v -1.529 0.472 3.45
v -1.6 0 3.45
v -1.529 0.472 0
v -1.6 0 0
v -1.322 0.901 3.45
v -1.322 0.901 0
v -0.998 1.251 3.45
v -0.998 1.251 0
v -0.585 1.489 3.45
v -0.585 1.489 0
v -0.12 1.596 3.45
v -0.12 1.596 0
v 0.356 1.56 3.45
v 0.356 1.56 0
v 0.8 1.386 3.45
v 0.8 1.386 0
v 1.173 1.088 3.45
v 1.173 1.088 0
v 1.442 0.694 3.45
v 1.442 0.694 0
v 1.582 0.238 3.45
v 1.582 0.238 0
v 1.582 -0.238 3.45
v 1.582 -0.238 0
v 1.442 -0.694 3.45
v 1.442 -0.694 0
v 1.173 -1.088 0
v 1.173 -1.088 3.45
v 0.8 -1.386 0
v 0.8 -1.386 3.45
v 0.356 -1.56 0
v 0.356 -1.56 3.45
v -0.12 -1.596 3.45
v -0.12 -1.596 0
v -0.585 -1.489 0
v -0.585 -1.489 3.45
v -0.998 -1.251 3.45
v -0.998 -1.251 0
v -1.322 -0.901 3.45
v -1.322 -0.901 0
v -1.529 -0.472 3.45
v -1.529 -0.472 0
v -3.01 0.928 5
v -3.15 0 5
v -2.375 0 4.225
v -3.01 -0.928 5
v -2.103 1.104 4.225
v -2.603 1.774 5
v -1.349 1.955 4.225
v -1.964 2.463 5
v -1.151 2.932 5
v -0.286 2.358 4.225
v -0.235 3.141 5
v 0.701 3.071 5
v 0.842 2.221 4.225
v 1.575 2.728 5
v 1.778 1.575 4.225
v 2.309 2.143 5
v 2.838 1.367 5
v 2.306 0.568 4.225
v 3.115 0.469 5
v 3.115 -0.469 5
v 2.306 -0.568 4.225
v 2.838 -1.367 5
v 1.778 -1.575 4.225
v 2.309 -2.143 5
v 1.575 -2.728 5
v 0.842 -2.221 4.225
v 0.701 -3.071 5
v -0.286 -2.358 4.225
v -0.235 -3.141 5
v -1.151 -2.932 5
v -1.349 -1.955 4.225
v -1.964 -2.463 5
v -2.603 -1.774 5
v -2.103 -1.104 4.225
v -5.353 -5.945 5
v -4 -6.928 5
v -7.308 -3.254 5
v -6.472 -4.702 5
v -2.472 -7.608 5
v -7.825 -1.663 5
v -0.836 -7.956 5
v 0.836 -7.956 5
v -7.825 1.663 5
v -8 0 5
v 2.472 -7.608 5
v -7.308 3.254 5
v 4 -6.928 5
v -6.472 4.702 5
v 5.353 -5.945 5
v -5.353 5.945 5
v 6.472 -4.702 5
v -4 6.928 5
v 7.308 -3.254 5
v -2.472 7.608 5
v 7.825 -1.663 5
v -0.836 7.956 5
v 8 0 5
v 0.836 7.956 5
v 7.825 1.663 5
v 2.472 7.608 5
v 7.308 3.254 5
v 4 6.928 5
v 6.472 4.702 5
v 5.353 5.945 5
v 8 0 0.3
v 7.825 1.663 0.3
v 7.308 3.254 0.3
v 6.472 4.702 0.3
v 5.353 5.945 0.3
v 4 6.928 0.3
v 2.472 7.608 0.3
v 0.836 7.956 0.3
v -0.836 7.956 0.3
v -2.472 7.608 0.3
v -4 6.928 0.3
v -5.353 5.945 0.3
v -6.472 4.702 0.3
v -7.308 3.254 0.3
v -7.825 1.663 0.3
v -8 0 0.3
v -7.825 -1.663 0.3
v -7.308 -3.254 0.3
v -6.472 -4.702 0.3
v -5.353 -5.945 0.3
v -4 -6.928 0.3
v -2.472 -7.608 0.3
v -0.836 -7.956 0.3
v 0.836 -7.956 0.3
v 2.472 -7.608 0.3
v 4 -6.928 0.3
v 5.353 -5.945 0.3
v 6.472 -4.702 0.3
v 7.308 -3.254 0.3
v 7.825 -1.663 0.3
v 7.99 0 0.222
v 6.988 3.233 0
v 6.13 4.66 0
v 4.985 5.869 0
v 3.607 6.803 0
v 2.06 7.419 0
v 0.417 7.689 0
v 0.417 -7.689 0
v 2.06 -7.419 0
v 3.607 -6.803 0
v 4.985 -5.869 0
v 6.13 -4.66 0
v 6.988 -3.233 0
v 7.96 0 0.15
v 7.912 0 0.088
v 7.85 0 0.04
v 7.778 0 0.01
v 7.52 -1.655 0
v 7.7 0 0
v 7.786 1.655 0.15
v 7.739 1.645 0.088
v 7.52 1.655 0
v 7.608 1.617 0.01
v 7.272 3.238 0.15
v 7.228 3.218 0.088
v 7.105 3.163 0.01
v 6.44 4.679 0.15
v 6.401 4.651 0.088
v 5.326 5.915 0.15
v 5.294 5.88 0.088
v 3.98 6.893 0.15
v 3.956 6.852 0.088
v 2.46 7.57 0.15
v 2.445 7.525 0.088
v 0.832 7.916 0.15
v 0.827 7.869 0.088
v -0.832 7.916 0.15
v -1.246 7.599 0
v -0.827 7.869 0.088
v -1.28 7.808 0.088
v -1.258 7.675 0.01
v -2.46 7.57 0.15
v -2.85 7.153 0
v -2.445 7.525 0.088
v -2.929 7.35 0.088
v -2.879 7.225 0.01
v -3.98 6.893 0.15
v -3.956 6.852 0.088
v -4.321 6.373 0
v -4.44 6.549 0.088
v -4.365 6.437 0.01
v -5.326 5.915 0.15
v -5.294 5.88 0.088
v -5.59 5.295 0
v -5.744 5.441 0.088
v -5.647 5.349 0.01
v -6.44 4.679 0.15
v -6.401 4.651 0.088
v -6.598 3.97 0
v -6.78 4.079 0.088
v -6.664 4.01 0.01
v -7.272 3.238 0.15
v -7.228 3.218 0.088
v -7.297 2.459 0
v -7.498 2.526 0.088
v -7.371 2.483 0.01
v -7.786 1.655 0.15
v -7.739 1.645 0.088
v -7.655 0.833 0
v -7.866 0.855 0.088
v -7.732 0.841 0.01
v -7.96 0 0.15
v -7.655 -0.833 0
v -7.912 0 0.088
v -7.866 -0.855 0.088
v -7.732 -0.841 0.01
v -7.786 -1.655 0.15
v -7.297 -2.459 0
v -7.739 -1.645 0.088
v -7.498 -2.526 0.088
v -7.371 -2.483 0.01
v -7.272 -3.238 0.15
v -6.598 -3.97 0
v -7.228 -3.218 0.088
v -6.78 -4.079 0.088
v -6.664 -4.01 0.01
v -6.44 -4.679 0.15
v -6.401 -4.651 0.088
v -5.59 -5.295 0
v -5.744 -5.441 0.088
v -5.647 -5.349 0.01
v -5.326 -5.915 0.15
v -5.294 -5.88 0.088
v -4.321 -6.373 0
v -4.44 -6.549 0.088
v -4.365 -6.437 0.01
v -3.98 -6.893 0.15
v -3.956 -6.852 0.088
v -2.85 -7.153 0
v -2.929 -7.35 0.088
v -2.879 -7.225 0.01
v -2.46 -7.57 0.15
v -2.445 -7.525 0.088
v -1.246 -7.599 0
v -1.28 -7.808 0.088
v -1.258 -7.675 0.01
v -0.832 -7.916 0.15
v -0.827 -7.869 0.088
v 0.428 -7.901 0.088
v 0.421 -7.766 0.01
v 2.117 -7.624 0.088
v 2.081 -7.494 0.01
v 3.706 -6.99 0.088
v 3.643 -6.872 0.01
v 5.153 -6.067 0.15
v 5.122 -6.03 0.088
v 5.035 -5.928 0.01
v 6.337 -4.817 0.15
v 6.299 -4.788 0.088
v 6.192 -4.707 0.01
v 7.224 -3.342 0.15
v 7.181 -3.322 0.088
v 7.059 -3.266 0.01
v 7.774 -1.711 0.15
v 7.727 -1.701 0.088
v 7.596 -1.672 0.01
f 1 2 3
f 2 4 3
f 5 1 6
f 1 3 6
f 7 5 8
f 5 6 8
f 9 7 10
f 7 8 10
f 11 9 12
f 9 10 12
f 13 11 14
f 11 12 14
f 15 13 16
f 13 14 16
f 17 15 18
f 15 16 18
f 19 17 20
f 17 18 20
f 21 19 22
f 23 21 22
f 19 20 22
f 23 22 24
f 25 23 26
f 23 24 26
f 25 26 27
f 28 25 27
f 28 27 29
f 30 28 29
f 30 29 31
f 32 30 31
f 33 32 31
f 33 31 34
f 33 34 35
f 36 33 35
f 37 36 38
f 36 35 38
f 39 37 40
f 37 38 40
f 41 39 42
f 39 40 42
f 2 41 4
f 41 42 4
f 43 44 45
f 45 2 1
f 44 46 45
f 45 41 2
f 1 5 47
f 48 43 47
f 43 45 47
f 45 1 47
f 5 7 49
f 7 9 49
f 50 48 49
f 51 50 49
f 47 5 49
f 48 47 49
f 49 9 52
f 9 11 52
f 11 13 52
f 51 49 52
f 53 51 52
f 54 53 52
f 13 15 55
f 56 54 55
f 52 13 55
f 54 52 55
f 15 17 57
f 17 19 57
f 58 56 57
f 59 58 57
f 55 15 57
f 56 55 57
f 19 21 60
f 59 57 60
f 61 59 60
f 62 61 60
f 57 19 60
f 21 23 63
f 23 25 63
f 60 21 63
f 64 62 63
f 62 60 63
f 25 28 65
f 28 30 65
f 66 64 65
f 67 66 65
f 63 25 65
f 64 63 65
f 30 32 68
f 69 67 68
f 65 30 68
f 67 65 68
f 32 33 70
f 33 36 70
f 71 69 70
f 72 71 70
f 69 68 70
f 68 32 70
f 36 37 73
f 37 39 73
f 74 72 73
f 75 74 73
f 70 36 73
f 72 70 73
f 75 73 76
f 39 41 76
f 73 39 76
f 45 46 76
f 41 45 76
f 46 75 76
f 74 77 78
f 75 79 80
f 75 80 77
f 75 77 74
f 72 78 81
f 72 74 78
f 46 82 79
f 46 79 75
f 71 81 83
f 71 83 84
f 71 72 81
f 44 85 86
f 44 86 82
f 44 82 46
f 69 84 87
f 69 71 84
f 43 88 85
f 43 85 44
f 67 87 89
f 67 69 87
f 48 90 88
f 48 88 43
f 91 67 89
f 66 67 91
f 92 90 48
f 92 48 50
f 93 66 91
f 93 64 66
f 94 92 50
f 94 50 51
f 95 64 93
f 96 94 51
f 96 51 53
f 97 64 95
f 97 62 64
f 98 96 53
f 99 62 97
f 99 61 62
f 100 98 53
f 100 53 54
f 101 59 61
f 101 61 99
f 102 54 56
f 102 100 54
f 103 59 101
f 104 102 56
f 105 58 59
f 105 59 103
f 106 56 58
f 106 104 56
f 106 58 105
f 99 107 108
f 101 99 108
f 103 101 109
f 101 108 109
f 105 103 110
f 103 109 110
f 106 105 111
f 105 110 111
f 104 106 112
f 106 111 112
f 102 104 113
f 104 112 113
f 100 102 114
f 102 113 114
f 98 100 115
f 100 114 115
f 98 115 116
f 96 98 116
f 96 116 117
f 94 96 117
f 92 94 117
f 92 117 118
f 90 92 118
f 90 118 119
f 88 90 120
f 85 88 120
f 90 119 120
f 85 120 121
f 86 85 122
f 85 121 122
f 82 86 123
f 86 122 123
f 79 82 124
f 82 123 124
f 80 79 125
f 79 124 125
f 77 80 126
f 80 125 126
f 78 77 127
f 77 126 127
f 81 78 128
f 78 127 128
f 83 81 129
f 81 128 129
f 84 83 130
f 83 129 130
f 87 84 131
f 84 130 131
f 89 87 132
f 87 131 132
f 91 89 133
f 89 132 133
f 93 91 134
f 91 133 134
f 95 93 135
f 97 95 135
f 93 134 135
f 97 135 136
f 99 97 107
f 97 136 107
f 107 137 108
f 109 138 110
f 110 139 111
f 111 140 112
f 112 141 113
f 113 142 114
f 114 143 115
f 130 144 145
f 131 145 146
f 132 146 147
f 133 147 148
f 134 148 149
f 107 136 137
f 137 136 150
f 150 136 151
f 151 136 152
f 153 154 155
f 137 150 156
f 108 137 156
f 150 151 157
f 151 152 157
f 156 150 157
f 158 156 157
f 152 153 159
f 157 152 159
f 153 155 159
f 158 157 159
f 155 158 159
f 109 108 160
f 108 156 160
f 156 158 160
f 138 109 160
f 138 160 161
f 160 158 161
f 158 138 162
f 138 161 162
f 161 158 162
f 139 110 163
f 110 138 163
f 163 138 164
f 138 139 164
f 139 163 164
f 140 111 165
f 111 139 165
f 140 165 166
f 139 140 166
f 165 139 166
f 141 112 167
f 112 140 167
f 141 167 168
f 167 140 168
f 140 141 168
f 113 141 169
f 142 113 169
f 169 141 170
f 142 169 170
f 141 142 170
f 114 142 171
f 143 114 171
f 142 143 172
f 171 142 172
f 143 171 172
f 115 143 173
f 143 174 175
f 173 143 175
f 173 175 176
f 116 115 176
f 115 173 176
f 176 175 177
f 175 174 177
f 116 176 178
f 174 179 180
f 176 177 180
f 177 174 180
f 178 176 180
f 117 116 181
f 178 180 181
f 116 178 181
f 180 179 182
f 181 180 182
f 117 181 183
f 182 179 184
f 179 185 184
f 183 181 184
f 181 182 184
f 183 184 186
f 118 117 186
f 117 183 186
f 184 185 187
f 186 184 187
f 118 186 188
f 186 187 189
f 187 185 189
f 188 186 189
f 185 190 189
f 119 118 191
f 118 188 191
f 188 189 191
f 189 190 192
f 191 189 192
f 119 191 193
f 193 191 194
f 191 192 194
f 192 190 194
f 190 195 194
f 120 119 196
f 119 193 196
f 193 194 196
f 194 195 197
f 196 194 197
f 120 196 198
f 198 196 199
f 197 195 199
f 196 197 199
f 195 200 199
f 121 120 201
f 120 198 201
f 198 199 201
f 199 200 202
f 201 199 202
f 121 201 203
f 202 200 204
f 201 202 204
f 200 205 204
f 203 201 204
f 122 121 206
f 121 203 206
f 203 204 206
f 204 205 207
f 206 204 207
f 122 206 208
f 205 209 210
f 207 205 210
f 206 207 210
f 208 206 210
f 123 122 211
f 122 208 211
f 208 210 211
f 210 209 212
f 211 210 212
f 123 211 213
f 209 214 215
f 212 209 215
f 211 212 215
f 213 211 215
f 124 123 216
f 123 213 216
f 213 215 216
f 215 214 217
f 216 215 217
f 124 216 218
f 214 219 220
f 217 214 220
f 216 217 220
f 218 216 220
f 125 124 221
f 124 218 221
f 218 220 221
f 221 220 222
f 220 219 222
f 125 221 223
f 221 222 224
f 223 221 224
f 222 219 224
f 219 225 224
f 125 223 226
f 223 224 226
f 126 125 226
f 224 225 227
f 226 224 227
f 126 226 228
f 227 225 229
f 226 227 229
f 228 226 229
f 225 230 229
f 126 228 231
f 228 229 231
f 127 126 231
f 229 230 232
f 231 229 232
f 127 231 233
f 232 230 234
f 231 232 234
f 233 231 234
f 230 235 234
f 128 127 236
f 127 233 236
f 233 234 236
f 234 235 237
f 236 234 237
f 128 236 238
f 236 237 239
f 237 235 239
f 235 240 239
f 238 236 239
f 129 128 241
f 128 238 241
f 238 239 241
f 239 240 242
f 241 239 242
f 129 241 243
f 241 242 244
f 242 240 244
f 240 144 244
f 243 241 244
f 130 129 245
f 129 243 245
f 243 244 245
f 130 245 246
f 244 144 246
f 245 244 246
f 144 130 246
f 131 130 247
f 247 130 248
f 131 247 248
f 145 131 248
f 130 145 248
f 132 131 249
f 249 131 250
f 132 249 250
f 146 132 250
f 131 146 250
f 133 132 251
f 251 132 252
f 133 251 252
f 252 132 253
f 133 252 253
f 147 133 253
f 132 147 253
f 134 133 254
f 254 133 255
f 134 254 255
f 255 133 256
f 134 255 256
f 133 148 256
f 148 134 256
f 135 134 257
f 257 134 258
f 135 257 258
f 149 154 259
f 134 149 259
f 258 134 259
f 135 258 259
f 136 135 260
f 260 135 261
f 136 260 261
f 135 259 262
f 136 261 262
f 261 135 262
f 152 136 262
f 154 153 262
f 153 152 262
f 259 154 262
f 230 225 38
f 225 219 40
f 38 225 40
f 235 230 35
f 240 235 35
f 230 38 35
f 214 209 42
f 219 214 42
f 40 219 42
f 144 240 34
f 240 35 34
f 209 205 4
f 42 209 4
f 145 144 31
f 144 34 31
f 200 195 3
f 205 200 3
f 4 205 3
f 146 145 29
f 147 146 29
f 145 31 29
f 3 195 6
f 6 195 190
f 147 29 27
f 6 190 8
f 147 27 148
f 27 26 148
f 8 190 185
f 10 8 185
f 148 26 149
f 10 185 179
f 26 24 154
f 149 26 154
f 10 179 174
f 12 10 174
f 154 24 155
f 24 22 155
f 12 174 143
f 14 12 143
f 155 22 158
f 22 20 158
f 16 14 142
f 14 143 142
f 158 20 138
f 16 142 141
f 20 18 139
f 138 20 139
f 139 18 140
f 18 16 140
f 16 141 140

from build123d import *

# Parameters (mm, degrees)
ESBO_O1_R                                            = 8
RESSALTO_EXTRUS_O1_DEPTH                             = 5
FORMSENKUNG_F_R_M3_LINSENSENKSCHRAUBE_MI_D           = 3.2
FORMSENKUNG_F_R_M3_LINSENSENKSCHRAUBE_MI_DEPTH       = 20.87
FORMSENKUNG_F_R_M3_LINSENSENKSCHRAUBE_MI_CSINK_D     = 6.3
FORMSENKUNG_F_R_M3_LINSENSENKSCHRAUBE_MI_CSINK_ANGLE = 90
FORMSENKUNG_F_R_M3_LINSENSENKSCHRAUBE_MI_TIP         = 0.96137699
FILETE1_R                                            = 0.3


with BuildPart() as part:
    # Esboço1 → Ressalto-extrusão1 (new body)
    with BuildSketch(Plane.XY):
        Circle(ESBO_O1_R)
    extrude(amount=RESSALTO_EXTRUS_O1_DEPTH)

    # Formsenkung für M3 Linsensenkschraube mit Schlitz1
    with Locations(Plane.XY.offset(5)):
        with Locations((0, 0)):
            CounterSinkHole(FORMSENKUNG_F_R_M3_LINSENSENKSCHRAUBE_MI_D / 2, FORMSENKUNG_F_R_M3_LINSENSENKSCHRAUBE_MI_CSINK_D / 2, depth=FORMSENKUNG_F_R_M3_LINSENSENKSCHRAUBE_MI_DEPTH, counter_sink_angle=FORMSENKUNG_F_R_M3_LINSENSENKSCHRAUBE_MI_CSINK_ANGLE)
            with Locations((0, 0, -(FORMSENKUNG_F_R_M3_LINSENSENKSCHRAUBE_MI_DEPTH + FORMSENKUNG_F_R_M3_LINSENSENKSCHRAUBE_MI_TIP / 2))):  # 118° drill point
                Cone(0, FORMSENKUNG_F_R_M3_LINSENSENKSCHRAUBE_MI_D / 2, FORMSENKUNG_F_R_M3_LINSENSENKSCHRAUBE_MI_TIP, mode=Mode.SUBTRACT)

    # Filete1
    filete1_edges = [part.edges().sort_by_distance(p)[0] for p in [
        (-8, 0, 0),
    ]]
    fillet(filete1_edges, radius=FILETE1_R)


solid = part.part
